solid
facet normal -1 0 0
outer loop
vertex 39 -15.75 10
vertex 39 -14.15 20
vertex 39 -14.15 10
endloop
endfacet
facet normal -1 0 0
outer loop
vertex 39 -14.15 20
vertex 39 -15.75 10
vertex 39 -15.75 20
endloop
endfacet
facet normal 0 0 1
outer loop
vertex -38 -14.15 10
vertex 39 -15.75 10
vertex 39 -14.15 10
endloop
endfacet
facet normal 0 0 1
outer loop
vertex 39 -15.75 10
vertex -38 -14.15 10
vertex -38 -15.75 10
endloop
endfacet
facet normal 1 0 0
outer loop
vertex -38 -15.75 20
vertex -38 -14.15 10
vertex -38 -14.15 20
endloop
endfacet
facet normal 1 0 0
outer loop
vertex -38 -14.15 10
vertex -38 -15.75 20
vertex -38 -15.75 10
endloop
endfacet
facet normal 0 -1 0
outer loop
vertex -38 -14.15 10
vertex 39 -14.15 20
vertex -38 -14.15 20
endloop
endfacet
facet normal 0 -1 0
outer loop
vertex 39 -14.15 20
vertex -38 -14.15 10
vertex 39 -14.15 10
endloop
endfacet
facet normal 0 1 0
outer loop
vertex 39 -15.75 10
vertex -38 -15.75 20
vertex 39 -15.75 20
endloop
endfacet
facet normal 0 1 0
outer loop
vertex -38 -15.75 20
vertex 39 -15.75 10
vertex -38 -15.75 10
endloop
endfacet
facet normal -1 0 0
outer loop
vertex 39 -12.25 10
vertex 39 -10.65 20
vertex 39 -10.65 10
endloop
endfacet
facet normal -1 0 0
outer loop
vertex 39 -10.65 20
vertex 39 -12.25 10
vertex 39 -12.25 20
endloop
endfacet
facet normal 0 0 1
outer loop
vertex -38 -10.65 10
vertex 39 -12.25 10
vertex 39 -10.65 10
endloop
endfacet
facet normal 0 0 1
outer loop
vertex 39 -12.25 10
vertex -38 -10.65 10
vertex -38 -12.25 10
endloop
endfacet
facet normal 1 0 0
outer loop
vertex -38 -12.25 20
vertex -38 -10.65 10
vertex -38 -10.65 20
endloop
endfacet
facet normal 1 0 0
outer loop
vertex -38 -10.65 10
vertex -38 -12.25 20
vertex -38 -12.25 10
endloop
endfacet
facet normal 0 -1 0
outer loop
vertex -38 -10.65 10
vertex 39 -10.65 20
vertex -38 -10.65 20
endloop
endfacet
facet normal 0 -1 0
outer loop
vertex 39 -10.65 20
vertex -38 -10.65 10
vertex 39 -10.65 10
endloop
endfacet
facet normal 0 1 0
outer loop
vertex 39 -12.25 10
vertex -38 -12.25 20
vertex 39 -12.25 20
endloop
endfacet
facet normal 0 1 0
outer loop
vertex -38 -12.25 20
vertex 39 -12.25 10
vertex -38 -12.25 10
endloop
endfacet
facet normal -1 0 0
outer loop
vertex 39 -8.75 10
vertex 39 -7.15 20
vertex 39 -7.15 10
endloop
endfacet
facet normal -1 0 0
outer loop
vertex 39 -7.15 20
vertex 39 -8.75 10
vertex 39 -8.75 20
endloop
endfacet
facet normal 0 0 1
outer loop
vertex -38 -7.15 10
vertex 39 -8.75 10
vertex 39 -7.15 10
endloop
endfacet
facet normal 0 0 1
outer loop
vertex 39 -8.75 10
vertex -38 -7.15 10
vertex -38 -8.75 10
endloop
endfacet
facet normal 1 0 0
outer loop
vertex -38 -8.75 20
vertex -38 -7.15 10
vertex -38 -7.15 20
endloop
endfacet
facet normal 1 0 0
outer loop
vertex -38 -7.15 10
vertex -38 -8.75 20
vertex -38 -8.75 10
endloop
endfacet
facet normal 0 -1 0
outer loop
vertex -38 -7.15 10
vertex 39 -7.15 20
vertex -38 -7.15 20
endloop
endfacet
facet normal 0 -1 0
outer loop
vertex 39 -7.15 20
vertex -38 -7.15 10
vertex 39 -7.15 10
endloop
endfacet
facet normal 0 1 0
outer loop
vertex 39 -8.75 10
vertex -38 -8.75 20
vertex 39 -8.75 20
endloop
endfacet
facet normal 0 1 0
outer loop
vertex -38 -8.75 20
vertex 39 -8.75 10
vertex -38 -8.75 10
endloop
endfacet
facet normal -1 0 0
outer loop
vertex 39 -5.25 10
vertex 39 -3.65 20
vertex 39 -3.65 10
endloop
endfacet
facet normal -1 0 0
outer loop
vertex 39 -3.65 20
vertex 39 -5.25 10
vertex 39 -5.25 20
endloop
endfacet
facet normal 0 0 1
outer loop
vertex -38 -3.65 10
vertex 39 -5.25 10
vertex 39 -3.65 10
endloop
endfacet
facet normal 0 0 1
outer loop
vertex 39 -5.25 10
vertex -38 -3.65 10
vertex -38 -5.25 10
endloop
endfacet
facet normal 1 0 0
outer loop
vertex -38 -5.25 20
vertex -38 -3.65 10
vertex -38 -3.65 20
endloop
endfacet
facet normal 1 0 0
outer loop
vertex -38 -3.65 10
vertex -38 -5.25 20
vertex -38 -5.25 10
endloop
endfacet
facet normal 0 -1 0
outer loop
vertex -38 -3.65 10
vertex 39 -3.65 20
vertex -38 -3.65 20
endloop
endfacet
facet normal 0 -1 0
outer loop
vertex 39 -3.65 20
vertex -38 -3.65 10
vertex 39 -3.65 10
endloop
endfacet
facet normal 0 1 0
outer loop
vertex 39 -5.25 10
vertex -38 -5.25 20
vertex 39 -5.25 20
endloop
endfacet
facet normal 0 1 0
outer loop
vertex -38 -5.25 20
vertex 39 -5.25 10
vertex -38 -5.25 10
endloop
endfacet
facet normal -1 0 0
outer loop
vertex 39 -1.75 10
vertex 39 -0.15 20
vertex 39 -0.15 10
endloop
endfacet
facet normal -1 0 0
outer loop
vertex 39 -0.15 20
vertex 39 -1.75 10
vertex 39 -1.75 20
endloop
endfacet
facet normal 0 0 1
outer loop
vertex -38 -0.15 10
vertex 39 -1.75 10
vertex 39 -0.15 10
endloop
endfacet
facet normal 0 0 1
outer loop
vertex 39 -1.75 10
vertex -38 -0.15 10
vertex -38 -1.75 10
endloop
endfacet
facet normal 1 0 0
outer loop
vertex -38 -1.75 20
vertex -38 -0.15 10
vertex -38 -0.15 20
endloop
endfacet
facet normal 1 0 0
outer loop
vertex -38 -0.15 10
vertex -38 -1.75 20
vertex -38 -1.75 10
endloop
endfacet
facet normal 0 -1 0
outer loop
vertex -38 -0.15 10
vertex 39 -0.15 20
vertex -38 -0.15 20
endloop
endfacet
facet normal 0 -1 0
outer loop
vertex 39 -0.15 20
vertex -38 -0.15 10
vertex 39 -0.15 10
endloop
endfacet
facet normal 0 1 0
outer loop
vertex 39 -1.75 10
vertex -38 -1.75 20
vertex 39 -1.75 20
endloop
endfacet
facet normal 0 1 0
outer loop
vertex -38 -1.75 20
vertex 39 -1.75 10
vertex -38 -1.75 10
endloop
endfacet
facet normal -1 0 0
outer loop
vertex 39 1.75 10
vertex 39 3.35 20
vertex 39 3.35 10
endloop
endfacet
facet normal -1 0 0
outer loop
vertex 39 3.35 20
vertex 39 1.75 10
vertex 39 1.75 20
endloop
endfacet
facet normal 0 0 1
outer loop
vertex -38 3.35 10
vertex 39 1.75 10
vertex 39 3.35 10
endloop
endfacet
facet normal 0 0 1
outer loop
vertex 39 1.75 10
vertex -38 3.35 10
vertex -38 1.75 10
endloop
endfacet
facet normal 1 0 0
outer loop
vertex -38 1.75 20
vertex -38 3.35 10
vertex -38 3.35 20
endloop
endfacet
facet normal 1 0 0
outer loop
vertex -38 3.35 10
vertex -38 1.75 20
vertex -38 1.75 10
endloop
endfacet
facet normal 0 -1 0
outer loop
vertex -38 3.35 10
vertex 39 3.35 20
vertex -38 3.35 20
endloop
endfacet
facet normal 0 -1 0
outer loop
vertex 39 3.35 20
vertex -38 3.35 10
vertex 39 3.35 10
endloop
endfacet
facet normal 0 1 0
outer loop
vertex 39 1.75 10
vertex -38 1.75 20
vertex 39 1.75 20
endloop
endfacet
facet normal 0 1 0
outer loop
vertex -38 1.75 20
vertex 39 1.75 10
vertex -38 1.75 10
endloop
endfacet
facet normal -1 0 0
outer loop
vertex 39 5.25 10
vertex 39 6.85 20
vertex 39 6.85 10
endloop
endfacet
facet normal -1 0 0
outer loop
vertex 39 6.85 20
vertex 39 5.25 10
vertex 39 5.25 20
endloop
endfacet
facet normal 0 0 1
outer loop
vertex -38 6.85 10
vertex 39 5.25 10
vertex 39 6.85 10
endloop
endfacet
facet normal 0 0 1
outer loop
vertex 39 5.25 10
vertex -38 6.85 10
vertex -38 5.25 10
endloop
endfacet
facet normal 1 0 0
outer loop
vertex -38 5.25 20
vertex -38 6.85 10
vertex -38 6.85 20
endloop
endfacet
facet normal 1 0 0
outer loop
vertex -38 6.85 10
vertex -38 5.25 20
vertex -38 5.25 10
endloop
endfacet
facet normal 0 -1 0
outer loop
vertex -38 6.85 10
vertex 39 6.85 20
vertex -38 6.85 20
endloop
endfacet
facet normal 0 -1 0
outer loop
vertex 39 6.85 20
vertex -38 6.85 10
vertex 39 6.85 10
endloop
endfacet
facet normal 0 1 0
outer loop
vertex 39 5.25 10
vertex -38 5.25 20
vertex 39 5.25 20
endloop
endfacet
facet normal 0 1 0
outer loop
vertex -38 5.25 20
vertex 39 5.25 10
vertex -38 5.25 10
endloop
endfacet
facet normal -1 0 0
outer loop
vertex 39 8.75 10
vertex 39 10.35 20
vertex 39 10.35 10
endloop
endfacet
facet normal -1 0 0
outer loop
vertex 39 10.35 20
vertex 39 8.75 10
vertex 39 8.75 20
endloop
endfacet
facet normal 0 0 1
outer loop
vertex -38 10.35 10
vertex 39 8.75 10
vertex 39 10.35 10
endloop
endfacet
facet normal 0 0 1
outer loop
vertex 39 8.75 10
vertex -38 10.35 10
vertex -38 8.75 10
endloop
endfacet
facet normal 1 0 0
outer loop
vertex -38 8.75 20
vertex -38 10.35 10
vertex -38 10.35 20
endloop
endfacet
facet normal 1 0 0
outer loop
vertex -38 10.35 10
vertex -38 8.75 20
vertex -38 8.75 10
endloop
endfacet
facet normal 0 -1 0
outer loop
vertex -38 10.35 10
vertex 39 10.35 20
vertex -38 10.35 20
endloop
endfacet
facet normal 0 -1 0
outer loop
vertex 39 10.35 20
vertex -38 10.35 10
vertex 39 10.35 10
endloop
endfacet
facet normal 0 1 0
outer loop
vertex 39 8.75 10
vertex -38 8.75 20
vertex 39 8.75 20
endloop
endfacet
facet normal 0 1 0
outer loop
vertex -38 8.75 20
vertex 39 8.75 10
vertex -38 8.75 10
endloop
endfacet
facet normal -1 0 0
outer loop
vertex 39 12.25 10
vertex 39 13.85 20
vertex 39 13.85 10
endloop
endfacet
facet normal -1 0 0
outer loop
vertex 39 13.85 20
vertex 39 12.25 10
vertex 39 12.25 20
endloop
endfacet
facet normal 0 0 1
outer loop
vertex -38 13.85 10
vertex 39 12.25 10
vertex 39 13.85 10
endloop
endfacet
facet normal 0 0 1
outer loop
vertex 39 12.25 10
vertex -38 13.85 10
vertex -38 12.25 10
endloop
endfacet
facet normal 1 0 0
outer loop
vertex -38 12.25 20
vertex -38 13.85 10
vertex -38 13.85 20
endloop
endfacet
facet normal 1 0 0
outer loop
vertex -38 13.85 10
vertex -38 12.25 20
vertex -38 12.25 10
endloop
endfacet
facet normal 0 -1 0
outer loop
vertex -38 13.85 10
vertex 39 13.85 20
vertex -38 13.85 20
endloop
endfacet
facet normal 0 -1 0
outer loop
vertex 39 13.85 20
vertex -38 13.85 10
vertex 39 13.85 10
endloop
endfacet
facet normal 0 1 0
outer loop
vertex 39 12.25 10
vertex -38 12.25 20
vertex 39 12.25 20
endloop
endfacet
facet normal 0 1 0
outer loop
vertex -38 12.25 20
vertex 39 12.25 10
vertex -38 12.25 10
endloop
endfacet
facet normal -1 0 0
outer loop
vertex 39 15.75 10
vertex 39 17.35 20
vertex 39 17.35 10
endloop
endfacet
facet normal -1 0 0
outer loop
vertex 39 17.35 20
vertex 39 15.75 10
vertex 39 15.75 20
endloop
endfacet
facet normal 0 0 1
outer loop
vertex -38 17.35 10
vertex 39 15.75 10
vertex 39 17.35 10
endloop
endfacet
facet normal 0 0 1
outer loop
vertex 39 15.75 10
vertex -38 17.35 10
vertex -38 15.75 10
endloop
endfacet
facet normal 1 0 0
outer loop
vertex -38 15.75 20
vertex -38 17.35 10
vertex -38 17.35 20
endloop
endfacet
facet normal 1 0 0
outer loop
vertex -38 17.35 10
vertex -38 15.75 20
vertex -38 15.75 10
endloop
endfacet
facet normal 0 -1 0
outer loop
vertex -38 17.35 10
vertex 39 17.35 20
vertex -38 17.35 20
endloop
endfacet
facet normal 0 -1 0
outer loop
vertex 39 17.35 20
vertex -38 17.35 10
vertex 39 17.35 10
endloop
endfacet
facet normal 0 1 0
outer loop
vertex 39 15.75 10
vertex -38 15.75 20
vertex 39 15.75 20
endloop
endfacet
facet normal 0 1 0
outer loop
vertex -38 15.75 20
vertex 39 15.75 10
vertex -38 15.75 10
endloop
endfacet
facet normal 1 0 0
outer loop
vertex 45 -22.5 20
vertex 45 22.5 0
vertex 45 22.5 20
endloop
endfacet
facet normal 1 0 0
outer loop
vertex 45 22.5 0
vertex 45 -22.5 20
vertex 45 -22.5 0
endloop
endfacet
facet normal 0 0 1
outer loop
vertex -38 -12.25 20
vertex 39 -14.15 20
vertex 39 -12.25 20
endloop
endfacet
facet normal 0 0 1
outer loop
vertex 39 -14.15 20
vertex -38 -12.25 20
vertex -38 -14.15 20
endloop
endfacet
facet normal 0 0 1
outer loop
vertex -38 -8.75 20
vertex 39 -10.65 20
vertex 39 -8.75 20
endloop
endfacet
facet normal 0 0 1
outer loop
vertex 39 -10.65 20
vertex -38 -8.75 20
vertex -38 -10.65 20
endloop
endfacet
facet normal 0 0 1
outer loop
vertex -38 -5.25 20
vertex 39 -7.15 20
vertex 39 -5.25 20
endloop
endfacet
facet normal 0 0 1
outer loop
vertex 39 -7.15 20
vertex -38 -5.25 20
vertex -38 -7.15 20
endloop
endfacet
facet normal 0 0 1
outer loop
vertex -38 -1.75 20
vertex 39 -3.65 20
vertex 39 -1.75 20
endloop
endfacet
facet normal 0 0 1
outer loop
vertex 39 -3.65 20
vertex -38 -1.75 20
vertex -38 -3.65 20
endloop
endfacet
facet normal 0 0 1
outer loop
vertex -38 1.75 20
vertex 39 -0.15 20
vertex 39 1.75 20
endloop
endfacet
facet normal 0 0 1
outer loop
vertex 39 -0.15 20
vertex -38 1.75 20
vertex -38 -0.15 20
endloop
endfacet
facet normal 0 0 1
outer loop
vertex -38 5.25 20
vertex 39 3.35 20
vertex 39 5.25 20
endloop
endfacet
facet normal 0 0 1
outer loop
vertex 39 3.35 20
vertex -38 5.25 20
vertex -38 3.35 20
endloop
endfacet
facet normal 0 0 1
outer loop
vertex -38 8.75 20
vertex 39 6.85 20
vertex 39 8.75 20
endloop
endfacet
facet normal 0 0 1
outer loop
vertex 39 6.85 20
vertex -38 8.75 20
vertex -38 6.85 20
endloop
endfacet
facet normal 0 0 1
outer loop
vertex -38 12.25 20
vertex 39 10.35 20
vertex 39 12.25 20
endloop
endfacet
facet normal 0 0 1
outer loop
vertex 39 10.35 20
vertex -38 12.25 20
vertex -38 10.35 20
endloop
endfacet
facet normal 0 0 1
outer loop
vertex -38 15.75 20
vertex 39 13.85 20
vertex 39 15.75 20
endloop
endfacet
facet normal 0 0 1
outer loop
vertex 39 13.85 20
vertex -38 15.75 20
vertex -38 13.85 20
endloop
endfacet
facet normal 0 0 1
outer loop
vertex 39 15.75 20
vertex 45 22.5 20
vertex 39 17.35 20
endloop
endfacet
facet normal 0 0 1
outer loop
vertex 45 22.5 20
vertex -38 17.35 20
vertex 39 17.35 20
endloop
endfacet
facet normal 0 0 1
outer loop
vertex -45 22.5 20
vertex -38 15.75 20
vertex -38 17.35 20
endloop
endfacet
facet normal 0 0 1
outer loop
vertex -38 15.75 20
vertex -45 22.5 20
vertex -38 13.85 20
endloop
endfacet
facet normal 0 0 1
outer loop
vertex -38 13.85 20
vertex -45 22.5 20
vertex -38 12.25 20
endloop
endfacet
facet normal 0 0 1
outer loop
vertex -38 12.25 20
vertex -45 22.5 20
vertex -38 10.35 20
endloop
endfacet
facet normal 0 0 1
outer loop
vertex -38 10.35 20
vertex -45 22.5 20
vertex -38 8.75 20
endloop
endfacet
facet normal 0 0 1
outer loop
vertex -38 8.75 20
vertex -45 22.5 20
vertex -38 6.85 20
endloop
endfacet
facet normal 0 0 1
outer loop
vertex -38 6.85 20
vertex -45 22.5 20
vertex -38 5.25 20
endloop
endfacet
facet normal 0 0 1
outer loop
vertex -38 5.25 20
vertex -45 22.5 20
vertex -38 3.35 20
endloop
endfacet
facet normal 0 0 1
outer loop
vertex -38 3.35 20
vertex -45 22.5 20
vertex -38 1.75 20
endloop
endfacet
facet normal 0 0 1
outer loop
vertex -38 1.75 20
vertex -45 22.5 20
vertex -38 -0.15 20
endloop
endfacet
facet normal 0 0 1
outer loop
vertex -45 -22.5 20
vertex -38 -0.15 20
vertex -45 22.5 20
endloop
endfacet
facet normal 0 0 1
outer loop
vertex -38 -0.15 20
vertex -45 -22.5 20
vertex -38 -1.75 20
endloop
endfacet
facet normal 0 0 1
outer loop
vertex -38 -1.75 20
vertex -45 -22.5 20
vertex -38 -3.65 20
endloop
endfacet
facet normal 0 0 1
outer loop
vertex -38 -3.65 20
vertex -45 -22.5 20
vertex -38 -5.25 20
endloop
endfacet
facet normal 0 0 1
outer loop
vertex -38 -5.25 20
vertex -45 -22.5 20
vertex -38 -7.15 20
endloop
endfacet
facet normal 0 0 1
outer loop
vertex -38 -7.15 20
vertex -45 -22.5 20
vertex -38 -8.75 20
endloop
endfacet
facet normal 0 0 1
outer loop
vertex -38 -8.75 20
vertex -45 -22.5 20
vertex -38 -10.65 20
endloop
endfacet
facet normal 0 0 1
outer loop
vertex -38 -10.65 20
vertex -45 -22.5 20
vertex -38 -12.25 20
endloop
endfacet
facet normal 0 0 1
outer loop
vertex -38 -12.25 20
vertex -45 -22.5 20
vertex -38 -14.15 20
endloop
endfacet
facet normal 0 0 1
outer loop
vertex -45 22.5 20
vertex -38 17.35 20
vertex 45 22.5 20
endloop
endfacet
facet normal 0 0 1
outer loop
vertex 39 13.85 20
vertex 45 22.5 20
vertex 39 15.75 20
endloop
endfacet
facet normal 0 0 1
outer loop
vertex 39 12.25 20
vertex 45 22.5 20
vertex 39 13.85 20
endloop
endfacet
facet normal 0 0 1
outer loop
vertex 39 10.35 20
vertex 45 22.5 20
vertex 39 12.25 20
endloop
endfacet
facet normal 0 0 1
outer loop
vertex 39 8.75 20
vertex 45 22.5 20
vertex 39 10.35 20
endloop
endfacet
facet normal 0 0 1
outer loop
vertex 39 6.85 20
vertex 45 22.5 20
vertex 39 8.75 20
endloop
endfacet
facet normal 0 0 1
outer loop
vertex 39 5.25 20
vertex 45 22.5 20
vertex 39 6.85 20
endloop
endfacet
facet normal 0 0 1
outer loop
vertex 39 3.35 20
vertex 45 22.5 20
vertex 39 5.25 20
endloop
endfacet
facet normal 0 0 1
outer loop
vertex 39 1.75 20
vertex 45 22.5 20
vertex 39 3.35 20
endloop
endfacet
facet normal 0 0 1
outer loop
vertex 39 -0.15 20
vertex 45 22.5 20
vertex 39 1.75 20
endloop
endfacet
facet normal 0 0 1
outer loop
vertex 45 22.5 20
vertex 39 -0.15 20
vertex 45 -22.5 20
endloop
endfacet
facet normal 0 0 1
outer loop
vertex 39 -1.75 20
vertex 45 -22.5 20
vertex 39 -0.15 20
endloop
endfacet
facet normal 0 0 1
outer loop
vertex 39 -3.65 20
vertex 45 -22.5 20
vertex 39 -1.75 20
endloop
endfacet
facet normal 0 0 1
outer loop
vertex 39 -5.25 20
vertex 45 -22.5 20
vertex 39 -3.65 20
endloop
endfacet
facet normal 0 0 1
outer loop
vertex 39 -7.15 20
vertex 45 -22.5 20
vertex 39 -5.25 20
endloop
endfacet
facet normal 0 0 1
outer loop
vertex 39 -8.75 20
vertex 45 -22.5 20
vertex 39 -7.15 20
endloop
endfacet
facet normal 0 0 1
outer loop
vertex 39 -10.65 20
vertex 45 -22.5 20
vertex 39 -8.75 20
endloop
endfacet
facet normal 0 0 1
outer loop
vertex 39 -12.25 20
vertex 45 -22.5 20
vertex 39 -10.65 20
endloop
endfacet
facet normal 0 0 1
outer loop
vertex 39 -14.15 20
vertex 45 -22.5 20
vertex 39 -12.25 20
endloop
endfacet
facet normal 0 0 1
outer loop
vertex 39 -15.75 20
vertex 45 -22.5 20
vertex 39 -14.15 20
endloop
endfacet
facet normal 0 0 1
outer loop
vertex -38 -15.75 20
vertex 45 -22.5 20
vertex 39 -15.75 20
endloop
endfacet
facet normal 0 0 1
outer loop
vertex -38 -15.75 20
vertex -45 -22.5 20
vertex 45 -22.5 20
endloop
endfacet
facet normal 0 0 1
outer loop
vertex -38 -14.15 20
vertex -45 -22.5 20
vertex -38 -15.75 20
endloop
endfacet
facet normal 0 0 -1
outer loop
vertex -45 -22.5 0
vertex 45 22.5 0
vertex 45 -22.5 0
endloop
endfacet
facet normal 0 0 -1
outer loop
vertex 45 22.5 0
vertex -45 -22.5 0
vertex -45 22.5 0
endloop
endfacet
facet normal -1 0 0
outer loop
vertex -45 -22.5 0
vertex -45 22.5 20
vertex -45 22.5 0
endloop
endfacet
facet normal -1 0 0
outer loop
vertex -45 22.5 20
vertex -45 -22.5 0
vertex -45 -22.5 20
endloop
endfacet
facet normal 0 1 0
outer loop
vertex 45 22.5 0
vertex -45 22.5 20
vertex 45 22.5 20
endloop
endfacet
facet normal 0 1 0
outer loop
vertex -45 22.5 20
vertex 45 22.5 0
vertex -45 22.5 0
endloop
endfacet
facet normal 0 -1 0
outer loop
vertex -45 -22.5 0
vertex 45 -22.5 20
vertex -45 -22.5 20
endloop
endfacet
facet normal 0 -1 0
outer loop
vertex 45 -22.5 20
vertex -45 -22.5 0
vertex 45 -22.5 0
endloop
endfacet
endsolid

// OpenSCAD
// Slide drying rack - holds 10 microscope slides standing on their long edge
// Print orientation: base block on the bed (z = 0), slots open upward.

// ---------------- Parameters ----------------
n_slots      = 10;    // number of slide slots
slide_len    = 75;    // slide length along X (mm)
slide_wid    = 25;    // slide width along Y (mm)
slide_thk    = 1;     // slide thickness along Z (mm)

base_len     = 90;    // base block length along X (mm)
base_wid     = 45;    // base block width along Y (mm)
base_h       = 20;    // base block height along Z (mm)

slot_len     = 77;    // slot length along X (mm)
slot_w       = 1.6;   // slot width along Y (mm)
slot_depth   = 10;    // slot depth from top face (mm)
slot_pitch   = 3.5;   // centre-to-centre slot spacing along Y (mm)

eps          = 0.5;   // overcut past faces to avoid coplanar surfaces (mm)

$fn = 64;

// ---------------- Derived ----------------
slot_y0 = -(n_slots - 1) * slot_pitch / 2;   // first slot centre Y

// ---------------- Model ----------------
difference() {
    // Base block, centred in X and Y, sitting on z = 0
    translate([-base_len / 2, -base_wid / 2, 0])
        cube([base_len, base_wid, base_h]);

    // Parallel slots running along X, open at the top
    for (i = [0 : n_slots - 1]) {
        translate([-(slot_len / 2 - eps), slot_y0 + i * slot_pitch,
                   base_h - slot_depth])
            cube([slot_len, slot_w, slot_depth + eps]);
    }
}
